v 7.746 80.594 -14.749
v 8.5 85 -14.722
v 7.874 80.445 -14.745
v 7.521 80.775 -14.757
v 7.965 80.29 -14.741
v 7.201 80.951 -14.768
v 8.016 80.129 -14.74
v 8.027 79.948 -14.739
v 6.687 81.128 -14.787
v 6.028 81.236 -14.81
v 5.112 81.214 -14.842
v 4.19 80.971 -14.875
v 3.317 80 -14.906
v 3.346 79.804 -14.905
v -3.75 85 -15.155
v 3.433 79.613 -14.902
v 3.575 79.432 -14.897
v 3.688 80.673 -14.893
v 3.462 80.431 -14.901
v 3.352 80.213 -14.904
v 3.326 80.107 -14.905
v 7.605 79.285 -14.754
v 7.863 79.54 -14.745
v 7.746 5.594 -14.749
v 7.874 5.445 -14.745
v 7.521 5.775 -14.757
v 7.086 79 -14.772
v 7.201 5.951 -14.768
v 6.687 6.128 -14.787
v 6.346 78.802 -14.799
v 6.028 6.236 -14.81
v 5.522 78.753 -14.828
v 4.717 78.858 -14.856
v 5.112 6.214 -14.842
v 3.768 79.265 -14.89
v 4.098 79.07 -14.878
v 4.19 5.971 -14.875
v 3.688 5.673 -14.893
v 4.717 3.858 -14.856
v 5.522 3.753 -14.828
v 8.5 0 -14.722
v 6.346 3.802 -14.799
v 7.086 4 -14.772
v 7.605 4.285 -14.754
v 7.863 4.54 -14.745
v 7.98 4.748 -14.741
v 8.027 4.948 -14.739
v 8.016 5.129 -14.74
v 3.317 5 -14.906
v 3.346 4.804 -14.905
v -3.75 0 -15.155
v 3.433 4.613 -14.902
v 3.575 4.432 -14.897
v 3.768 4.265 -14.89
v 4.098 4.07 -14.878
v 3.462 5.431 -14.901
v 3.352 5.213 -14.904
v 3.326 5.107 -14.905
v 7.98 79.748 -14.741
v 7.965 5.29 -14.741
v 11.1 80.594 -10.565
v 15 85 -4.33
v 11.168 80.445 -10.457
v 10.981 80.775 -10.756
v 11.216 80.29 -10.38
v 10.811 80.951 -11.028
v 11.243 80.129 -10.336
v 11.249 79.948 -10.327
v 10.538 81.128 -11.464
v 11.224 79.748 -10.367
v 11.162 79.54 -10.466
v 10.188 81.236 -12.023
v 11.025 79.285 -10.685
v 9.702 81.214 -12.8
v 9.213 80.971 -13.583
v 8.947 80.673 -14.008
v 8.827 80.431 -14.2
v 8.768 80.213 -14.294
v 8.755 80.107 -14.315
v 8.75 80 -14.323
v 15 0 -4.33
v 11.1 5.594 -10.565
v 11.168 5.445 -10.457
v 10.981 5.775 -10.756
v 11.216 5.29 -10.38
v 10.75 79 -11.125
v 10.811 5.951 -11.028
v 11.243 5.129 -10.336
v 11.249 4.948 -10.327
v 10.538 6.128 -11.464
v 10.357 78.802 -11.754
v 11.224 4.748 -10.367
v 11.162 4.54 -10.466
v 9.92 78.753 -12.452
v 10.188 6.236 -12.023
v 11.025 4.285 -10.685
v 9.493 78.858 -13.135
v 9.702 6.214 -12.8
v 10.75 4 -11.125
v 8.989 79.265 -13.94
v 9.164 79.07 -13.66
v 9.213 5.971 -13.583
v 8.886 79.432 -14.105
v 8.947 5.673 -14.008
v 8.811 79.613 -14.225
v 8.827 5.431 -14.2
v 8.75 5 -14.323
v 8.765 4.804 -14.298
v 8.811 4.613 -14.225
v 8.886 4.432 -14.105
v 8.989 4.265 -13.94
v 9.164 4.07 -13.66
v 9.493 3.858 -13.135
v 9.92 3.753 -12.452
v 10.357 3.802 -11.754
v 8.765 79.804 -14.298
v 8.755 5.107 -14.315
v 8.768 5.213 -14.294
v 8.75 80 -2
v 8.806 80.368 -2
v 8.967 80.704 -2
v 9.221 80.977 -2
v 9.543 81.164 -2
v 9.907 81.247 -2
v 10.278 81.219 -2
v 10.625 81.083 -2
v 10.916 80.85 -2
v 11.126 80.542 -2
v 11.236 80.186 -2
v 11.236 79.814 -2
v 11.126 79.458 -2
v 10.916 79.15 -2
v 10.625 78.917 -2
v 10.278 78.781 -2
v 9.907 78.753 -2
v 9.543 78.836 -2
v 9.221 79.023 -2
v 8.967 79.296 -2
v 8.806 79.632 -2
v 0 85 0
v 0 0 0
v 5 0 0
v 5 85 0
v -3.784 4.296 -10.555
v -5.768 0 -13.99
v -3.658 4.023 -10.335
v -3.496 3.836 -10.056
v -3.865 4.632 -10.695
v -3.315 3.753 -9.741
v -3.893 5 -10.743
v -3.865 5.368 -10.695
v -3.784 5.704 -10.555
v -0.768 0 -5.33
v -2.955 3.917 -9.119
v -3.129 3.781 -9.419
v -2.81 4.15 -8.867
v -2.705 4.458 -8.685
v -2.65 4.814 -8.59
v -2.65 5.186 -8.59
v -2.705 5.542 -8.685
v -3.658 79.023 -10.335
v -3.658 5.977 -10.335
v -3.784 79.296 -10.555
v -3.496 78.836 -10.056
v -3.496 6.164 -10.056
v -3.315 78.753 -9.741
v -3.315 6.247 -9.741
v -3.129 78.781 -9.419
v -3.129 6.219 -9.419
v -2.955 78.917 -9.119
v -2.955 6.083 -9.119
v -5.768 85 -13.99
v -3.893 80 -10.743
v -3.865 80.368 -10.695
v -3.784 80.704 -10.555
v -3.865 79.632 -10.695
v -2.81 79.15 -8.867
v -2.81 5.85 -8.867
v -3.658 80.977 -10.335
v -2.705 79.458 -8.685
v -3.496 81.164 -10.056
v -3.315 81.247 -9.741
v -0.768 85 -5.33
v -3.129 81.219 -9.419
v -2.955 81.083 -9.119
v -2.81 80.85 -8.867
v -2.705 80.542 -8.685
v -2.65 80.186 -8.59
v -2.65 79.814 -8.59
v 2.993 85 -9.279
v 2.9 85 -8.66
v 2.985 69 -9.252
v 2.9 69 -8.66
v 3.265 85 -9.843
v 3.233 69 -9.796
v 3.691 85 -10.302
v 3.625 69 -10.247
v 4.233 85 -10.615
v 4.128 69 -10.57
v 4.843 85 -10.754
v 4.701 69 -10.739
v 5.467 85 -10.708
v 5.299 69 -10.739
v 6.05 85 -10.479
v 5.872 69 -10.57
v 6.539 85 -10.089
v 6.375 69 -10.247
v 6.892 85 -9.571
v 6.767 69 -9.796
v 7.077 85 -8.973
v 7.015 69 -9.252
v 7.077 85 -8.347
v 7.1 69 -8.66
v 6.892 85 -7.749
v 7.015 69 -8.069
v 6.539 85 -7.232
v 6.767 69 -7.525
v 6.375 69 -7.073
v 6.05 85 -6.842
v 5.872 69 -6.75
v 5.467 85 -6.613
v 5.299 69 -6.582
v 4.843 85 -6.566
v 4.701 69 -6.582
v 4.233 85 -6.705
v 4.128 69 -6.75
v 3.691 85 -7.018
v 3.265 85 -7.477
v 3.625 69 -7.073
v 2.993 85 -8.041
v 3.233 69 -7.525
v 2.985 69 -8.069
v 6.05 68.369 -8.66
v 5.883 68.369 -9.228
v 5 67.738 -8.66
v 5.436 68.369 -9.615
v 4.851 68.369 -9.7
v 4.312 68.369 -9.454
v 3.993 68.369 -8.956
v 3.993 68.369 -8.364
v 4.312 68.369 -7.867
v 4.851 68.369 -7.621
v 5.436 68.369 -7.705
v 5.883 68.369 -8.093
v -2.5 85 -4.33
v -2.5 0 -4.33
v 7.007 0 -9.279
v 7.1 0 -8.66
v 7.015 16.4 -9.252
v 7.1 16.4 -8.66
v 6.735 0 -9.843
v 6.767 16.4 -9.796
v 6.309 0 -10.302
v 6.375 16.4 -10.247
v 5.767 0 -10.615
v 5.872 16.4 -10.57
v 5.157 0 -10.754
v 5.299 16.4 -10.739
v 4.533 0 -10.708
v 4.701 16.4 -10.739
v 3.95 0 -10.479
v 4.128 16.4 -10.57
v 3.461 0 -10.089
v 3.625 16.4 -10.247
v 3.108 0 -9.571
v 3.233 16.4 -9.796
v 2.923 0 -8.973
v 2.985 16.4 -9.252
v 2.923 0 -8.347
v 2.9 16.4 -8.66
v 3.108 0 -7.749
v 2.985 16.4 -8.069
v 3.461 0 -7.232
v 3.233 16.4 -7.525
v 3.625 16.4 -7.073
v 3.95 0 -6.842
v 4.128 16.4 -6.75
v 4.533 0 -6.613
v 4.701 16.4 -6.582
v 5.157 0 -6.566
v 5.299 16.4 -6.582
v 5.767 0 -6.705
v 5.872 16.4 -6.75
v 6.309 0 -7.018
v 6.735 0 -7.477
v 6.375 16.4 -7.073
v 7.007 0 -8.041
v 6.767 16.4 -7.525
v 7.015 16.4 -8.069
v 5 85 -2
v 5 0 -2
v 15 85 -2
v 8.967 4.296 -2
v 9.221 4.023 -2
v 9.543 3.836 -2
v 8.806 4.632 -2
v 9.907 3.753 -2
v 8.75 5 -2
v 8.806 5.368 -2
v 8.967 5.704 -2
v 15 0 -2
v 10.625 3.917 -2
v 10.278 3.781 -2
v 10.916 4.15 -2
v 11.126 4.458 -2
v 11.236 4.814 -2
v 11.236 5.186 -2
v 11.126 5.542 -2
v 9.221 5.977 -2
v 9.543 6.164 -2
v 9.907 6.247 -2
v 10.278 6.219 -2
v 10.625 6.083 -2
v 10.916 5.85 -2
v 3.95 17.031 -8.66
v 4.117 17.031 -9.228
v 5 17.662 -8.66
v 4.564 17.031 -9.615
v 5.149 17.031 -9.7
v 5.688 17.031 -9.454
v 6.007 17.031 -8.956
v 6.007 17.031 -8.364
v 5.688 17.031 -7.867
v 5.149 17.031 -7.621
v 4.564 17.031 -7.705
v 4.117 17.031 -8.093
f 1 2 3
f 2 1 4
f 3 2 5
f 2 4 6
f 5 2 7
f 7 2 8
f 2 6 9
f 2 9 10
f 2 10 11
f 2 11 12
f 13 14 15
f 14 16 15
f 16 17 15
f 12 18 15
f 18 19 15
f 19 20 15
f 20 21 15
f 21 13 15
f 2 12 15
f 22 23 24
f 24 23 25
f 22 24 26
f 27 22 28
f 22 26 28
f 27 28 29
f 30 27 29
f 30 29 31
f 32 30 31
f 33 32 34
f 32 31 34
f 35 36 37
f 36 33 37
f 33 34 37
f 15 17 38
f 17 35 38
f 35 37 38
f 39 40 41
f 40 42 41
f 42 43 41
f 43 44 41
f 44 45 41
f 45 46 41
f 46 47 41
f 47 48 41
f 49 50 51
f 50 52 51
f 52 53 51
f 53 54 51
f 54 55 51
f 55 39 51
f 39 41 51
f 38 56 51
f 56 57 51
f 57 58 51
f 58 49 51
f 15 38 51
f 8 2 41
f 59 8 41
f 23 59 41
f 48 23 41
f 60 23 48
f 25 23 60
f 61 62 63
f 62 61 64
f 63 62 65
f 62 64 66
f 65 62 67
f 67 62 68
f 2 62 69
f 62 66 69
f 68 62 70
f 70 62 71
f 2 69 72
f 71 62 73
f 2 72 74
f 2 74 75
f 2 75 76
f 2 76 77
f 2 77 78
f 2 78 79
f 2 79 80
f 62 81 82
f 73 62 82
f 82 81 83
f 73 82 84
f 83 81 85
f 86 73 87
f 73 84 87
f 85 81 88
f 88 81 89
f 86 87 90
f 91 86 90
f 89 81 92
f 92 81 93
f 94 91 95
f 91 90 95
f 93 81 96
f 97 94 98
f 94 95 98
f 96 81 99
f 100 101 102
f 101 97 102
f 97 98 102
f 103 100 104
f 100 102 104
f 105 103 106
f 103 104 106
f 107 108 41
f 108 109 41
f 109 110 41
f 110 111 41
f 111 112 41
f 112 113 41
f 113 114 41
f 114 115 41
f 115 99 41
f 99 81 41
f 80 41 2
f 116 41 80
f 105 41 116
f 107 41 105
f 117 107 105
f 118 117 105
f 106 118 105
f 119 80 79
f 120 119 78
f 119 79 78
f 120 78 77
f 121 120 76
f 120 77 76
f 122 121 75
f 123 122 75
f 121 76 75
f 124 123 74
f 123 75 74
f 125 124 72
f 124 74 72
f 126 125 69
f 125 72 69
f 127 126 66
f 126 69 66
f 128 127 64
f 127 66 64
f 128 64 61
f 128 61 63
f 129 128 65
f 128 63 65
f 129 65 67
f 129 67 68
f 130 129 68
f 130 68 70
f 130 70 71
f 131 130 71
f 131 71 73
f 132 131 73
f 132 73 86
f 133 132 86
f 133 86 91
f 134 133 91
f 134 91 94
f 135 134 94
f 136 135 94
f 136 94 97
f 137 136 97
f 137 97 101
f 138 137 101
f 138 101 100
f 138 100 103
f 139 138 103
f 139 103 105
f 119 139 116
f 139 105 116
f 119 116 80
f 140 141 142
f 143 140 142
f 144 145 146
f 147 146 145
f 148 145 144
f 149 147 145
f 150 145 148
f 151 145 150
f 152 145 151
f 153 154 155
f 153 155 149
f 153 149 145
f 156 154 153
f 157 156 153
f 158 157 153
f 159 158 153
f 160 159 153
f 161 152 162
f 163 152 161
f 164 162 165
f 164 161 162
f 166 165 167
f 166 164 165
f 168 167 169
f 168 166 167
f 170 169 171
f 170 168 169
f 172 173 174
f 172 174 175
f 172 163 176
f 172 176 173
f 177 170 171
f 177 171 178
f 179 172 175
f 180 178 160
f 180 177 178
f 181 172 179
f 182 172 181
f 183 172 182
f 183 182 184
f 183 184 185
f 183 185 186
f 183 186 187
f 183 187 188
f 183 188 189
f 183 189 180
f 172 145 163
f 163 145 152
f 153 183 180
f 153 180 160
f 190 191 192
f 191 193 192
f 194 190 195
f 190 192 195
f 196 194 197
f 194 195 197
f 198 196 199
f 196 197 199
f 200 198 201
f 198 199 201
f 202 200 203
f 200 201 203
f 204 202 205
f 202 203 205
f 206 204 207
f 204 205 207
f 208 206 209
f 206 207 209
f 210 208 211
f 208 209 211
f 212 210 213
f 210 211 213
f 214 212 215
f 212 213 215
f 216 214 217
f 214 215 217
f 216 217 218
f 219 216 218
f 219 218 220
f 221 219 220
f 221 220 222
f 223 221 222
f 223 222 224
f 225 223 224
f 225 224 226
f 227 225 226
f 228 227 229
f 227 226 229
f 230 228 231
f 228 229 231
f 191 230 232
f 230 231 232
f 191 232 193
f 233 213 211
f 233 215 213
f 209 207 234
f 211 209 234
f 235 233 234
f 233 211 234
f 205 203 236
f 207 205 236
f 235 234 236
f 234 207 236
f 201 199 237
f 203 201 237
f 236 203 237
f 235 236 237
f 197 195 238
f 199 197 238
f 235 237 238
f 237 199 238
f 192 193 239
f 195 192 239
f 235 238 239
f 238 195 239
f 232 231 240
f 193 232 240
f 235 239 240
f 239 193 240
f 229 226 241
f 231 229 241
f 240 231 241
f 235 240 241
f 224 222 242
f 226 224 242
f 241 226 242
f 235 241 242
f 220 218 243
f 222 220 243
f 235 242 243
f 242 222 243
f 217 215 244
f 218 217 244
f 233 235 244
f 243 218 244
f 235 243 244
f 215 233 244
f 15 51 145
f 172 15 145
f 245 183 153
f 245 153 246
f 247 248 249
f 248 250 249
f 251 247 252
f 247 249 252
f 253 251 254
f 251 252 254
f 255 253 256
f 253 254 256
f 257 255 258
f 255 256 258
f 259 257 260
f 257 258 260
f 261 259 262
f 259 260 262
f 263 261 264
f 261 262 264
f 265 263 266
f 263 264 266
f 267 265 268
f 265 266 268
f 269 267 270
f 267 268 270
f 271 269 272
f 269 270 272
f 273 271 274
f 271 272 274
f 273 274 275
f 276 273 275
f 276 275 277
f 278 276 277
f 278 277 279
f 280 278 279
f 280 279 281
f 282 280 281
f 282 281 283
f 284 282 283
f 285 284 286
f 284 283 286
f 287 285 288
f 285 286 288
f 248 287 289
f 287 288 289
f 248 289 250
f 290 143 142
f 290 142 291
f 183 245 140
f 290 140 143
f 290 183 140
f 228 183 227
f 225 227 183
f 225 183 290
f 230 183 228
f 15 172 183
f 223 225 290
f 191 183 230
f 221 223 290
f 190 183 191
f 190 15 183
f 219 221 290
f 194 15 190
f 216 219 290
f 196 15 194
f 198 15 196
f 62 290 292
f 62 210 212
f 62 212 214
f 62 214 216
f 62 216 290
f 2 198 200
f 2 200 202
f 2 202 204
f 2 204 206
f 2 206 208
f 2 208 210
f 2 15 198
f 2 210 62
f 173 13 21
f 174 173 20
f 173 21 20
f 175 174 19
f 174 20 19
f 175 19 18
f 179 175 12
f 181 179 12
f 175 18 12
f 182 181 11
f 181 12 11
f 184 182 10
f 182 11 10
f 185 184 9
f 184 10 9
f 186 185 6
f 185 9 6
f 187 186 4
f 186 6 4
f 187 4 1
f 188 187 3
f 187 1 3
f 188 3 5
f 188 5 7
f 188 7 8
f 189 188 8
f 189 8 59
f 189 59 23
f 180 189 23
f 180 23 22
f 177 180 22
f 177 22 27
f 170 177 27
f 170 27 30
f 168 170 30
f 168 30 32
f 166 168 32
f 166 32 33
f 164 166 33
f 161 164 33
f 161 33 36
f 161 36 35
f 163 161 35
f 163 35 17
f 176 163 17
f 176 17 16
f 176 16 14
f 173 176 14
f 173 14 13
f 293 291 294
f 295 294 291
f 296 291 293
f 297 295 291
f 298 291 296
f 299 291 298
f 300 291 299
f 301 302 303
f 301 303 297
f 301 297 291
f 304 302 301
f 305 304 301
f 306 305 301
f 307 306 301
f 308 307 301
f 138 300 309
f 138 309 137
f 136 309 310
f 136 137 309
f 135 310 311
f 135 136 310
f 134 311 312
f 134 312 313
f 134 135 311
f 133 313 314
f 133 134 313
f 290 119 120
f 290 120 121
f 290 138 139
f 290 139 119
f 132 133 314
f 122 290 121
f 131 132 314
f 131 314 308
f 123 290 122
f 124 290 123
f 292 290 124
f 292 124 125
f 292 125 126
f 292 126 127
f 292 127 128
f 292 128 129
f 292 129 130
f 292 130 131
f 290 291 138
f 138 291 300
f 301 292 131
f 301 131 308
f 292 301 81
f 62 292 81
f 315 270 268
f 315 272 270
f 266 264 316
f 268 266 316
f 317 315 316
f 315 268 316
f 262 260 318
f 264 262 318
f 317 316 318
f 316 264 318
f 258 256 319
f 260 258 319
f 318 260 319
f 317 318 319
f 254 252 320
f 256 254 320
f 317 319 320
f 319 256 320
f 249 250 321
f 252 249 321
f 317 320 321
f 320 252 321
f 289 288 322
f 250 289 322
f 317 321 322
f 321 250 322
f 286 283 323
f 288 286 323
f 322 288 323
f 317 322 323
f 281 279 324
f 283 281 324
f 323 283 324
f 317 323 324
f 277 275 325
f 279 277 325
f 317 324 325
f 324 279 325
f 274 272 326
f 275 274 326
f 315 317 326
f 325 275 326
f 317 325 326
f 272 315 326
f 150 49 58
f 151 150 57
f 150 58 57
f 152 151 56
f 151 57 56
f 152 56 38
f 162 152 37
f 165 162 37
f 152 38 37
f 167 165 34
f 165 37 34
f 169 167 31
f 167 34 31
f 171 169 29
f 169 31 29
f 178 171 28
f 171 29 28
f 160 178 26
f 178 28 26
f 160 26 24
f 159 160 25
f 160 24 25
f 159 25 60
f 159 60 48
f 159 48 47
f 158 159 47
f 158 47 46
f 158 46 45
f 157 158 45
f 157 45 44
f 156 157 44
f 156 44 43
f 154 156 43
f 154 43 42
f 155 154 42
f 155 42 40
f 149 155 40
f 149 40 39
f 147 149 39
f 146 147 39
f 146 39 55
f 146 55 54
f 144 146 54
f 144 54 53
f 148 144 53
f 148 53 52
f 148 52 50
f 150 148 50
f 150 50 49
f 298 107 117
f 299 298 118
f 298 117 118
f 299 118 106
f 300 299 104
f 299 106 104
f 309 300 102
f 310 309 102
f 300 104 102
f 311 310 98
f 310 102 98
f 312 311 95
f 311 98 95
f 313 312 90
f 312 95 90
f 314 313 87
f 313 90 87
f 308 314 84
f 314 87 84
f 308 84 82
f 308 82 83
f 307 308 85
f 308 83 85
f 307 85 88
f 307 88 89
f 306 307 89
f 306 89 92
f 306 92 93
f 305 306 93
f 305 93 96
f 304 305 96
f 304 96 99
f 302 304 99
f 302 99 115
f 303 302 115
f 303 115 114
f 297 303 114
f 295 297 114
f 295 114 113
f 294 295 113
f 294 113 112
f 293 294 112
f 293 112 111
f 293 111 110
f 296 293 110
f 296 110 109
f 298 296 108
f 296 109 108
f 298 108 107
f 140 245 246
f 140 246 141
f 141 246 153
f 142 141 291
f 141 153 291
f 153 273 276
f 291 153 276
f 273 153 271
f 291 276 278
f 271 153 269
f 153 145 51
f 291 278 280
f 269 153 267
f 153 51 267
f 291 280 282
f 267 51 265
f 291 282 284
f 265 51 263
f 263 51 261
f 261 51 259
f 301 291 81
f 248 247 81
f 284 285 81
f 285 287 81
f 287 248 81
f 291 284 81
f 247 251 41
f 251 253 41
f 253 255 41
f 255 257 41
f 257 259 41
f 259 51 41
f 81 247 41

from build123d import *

# Parameters (mm, degrees)
BOSS_EXTRUDE1_DEPTH       = 85
SKETCH3_W                 = 10
SKETCH3_H                 = 2
CUT_EXTRUDE1_DEPTH        = 88.633826232
M5X0_8_TAPPED_HOLE1_D     = 4.2
M5X0_8_TAPPED_HOLE1_DEPTH = 16
M5X0_8_TAPPED_HOLE1_TIP   = 1.2618073
M5X0_8_TAPPED_HOLE2_D     = 4.2
M5X0_8_TAPPED_HOLE2_DEPTH = 16.4
M5X0_8_TAPPED_HOLE2_TIP   = 1.2618073
M3X0_5_TAPPED_HOLE1_D     = 2.5
M3X0_5_TAPPED_HOLE2_D     = 2.5


with BuildPart() as part:
    # Sketch1 → Boss-Extrude1 (new body)
    with BuildSketch(Plane(origin=(0, 0, 0), x_dir=(1, 0, 0), z_dir=(0, 1, 0))):
        Polygon((0, 0), (15, 0), (15, 4.330127019), (8.5, 14.722431864), (-3.75, 15.155444566), (-7.5, 12.990381057), align=None)
    extrude(amount=BOSS_EXTRUDE1_DEPTH)

    # Sketch3 → Cut-Extrude1 (cut, through all)
    with BuildSketch(Plane(origin=(0, 85, 0), x_dir=(1, 0, 0), z_dir=(0, 1, 0))):
        Polygon((-7.5, 12.990381057), (-5.767949192, 13.990381057), (-0.767949192, 5.330127019), (-2.5, 4.330127019), align=None)
        with Locations((10, 1)):
            Rectangle(SKETCH3_W, SKETCH3_H)
    extrude(amount=-CUT_EXTRUDE1_DEPTH, mode=Mode.SUBTRACT)

    # M5x0.8 Tapped Hole1
    with Locations(Plane(origin=(0, 85, 0), x_dir=(1, 0, 0), z_dir=(0, 1, 0))):
        with Locations((5, 8.660254038)):
            Hole(M5X0_8_TAPPED_HOLE1_D / 2, depth=M5X0_8_TAPPED_HOLE1_DEPTH)
            with Locations((0, 0, -(M5X0_8_TAPPED_HOLE1_DEPTH + M5X0_8_TAPPED_HOLE1_TIP / 2))):  # 118° drill point
                Cone(0, M5X0_8_TAPPED_HOLE1_D / 2, M5X0_8_TAPPED_HOLE1_TIP, mode=Mode.SUBTRACT)

    # M5x0.8 Tapped Hole2
    with Locations(Plane(origin=(0, 0, 0), x_dir=(-1, 0, 0), z_dir=(0, -1, 0))):
        with Locations((-5, 8.660254038)):
            Hole(M5X0_8_TAPPED_HOLE2_D / 2, depth=M5X0_8_TAPPED_HOLE2_DEPTH)
            with Locations((0, 0, -(M5X0_8_TAPPED_HOLE2_DEPTH + M5X0_8_TAPPED_HOLE2_TIP / 2))):  # 118° drill point
                Cone(0, M5X0_8_TAPPED_HOLE2_D / 2, M5X0_8_TAPPED_HOLE2_TIP, mode=Mode.SUBTRACT)

    # M3x0.5 Tapped Hole1 (through all)
    with Locations(Plane(origin=(1.732050808, 0, -1), x_dir=(0.49999999999999983, 0, 0.8660254037844387), z_dir=(-0.8660254037844387, 0, 0.49999999999999983))):
        with Locations((-10, 80), (-10, 5)):
            Hole(M3X0_5_TAPPED_HOLE1_D / 2)

    # M3x0.5 Tapped Hole2 (through all)
    with Locations(Plane.XY.offset(-2)):
        with Locations((10, 80), (10, 5)):
            Hole(M3X0_5_TAPPED_HOLE2_D / 2)


solid = part.part
